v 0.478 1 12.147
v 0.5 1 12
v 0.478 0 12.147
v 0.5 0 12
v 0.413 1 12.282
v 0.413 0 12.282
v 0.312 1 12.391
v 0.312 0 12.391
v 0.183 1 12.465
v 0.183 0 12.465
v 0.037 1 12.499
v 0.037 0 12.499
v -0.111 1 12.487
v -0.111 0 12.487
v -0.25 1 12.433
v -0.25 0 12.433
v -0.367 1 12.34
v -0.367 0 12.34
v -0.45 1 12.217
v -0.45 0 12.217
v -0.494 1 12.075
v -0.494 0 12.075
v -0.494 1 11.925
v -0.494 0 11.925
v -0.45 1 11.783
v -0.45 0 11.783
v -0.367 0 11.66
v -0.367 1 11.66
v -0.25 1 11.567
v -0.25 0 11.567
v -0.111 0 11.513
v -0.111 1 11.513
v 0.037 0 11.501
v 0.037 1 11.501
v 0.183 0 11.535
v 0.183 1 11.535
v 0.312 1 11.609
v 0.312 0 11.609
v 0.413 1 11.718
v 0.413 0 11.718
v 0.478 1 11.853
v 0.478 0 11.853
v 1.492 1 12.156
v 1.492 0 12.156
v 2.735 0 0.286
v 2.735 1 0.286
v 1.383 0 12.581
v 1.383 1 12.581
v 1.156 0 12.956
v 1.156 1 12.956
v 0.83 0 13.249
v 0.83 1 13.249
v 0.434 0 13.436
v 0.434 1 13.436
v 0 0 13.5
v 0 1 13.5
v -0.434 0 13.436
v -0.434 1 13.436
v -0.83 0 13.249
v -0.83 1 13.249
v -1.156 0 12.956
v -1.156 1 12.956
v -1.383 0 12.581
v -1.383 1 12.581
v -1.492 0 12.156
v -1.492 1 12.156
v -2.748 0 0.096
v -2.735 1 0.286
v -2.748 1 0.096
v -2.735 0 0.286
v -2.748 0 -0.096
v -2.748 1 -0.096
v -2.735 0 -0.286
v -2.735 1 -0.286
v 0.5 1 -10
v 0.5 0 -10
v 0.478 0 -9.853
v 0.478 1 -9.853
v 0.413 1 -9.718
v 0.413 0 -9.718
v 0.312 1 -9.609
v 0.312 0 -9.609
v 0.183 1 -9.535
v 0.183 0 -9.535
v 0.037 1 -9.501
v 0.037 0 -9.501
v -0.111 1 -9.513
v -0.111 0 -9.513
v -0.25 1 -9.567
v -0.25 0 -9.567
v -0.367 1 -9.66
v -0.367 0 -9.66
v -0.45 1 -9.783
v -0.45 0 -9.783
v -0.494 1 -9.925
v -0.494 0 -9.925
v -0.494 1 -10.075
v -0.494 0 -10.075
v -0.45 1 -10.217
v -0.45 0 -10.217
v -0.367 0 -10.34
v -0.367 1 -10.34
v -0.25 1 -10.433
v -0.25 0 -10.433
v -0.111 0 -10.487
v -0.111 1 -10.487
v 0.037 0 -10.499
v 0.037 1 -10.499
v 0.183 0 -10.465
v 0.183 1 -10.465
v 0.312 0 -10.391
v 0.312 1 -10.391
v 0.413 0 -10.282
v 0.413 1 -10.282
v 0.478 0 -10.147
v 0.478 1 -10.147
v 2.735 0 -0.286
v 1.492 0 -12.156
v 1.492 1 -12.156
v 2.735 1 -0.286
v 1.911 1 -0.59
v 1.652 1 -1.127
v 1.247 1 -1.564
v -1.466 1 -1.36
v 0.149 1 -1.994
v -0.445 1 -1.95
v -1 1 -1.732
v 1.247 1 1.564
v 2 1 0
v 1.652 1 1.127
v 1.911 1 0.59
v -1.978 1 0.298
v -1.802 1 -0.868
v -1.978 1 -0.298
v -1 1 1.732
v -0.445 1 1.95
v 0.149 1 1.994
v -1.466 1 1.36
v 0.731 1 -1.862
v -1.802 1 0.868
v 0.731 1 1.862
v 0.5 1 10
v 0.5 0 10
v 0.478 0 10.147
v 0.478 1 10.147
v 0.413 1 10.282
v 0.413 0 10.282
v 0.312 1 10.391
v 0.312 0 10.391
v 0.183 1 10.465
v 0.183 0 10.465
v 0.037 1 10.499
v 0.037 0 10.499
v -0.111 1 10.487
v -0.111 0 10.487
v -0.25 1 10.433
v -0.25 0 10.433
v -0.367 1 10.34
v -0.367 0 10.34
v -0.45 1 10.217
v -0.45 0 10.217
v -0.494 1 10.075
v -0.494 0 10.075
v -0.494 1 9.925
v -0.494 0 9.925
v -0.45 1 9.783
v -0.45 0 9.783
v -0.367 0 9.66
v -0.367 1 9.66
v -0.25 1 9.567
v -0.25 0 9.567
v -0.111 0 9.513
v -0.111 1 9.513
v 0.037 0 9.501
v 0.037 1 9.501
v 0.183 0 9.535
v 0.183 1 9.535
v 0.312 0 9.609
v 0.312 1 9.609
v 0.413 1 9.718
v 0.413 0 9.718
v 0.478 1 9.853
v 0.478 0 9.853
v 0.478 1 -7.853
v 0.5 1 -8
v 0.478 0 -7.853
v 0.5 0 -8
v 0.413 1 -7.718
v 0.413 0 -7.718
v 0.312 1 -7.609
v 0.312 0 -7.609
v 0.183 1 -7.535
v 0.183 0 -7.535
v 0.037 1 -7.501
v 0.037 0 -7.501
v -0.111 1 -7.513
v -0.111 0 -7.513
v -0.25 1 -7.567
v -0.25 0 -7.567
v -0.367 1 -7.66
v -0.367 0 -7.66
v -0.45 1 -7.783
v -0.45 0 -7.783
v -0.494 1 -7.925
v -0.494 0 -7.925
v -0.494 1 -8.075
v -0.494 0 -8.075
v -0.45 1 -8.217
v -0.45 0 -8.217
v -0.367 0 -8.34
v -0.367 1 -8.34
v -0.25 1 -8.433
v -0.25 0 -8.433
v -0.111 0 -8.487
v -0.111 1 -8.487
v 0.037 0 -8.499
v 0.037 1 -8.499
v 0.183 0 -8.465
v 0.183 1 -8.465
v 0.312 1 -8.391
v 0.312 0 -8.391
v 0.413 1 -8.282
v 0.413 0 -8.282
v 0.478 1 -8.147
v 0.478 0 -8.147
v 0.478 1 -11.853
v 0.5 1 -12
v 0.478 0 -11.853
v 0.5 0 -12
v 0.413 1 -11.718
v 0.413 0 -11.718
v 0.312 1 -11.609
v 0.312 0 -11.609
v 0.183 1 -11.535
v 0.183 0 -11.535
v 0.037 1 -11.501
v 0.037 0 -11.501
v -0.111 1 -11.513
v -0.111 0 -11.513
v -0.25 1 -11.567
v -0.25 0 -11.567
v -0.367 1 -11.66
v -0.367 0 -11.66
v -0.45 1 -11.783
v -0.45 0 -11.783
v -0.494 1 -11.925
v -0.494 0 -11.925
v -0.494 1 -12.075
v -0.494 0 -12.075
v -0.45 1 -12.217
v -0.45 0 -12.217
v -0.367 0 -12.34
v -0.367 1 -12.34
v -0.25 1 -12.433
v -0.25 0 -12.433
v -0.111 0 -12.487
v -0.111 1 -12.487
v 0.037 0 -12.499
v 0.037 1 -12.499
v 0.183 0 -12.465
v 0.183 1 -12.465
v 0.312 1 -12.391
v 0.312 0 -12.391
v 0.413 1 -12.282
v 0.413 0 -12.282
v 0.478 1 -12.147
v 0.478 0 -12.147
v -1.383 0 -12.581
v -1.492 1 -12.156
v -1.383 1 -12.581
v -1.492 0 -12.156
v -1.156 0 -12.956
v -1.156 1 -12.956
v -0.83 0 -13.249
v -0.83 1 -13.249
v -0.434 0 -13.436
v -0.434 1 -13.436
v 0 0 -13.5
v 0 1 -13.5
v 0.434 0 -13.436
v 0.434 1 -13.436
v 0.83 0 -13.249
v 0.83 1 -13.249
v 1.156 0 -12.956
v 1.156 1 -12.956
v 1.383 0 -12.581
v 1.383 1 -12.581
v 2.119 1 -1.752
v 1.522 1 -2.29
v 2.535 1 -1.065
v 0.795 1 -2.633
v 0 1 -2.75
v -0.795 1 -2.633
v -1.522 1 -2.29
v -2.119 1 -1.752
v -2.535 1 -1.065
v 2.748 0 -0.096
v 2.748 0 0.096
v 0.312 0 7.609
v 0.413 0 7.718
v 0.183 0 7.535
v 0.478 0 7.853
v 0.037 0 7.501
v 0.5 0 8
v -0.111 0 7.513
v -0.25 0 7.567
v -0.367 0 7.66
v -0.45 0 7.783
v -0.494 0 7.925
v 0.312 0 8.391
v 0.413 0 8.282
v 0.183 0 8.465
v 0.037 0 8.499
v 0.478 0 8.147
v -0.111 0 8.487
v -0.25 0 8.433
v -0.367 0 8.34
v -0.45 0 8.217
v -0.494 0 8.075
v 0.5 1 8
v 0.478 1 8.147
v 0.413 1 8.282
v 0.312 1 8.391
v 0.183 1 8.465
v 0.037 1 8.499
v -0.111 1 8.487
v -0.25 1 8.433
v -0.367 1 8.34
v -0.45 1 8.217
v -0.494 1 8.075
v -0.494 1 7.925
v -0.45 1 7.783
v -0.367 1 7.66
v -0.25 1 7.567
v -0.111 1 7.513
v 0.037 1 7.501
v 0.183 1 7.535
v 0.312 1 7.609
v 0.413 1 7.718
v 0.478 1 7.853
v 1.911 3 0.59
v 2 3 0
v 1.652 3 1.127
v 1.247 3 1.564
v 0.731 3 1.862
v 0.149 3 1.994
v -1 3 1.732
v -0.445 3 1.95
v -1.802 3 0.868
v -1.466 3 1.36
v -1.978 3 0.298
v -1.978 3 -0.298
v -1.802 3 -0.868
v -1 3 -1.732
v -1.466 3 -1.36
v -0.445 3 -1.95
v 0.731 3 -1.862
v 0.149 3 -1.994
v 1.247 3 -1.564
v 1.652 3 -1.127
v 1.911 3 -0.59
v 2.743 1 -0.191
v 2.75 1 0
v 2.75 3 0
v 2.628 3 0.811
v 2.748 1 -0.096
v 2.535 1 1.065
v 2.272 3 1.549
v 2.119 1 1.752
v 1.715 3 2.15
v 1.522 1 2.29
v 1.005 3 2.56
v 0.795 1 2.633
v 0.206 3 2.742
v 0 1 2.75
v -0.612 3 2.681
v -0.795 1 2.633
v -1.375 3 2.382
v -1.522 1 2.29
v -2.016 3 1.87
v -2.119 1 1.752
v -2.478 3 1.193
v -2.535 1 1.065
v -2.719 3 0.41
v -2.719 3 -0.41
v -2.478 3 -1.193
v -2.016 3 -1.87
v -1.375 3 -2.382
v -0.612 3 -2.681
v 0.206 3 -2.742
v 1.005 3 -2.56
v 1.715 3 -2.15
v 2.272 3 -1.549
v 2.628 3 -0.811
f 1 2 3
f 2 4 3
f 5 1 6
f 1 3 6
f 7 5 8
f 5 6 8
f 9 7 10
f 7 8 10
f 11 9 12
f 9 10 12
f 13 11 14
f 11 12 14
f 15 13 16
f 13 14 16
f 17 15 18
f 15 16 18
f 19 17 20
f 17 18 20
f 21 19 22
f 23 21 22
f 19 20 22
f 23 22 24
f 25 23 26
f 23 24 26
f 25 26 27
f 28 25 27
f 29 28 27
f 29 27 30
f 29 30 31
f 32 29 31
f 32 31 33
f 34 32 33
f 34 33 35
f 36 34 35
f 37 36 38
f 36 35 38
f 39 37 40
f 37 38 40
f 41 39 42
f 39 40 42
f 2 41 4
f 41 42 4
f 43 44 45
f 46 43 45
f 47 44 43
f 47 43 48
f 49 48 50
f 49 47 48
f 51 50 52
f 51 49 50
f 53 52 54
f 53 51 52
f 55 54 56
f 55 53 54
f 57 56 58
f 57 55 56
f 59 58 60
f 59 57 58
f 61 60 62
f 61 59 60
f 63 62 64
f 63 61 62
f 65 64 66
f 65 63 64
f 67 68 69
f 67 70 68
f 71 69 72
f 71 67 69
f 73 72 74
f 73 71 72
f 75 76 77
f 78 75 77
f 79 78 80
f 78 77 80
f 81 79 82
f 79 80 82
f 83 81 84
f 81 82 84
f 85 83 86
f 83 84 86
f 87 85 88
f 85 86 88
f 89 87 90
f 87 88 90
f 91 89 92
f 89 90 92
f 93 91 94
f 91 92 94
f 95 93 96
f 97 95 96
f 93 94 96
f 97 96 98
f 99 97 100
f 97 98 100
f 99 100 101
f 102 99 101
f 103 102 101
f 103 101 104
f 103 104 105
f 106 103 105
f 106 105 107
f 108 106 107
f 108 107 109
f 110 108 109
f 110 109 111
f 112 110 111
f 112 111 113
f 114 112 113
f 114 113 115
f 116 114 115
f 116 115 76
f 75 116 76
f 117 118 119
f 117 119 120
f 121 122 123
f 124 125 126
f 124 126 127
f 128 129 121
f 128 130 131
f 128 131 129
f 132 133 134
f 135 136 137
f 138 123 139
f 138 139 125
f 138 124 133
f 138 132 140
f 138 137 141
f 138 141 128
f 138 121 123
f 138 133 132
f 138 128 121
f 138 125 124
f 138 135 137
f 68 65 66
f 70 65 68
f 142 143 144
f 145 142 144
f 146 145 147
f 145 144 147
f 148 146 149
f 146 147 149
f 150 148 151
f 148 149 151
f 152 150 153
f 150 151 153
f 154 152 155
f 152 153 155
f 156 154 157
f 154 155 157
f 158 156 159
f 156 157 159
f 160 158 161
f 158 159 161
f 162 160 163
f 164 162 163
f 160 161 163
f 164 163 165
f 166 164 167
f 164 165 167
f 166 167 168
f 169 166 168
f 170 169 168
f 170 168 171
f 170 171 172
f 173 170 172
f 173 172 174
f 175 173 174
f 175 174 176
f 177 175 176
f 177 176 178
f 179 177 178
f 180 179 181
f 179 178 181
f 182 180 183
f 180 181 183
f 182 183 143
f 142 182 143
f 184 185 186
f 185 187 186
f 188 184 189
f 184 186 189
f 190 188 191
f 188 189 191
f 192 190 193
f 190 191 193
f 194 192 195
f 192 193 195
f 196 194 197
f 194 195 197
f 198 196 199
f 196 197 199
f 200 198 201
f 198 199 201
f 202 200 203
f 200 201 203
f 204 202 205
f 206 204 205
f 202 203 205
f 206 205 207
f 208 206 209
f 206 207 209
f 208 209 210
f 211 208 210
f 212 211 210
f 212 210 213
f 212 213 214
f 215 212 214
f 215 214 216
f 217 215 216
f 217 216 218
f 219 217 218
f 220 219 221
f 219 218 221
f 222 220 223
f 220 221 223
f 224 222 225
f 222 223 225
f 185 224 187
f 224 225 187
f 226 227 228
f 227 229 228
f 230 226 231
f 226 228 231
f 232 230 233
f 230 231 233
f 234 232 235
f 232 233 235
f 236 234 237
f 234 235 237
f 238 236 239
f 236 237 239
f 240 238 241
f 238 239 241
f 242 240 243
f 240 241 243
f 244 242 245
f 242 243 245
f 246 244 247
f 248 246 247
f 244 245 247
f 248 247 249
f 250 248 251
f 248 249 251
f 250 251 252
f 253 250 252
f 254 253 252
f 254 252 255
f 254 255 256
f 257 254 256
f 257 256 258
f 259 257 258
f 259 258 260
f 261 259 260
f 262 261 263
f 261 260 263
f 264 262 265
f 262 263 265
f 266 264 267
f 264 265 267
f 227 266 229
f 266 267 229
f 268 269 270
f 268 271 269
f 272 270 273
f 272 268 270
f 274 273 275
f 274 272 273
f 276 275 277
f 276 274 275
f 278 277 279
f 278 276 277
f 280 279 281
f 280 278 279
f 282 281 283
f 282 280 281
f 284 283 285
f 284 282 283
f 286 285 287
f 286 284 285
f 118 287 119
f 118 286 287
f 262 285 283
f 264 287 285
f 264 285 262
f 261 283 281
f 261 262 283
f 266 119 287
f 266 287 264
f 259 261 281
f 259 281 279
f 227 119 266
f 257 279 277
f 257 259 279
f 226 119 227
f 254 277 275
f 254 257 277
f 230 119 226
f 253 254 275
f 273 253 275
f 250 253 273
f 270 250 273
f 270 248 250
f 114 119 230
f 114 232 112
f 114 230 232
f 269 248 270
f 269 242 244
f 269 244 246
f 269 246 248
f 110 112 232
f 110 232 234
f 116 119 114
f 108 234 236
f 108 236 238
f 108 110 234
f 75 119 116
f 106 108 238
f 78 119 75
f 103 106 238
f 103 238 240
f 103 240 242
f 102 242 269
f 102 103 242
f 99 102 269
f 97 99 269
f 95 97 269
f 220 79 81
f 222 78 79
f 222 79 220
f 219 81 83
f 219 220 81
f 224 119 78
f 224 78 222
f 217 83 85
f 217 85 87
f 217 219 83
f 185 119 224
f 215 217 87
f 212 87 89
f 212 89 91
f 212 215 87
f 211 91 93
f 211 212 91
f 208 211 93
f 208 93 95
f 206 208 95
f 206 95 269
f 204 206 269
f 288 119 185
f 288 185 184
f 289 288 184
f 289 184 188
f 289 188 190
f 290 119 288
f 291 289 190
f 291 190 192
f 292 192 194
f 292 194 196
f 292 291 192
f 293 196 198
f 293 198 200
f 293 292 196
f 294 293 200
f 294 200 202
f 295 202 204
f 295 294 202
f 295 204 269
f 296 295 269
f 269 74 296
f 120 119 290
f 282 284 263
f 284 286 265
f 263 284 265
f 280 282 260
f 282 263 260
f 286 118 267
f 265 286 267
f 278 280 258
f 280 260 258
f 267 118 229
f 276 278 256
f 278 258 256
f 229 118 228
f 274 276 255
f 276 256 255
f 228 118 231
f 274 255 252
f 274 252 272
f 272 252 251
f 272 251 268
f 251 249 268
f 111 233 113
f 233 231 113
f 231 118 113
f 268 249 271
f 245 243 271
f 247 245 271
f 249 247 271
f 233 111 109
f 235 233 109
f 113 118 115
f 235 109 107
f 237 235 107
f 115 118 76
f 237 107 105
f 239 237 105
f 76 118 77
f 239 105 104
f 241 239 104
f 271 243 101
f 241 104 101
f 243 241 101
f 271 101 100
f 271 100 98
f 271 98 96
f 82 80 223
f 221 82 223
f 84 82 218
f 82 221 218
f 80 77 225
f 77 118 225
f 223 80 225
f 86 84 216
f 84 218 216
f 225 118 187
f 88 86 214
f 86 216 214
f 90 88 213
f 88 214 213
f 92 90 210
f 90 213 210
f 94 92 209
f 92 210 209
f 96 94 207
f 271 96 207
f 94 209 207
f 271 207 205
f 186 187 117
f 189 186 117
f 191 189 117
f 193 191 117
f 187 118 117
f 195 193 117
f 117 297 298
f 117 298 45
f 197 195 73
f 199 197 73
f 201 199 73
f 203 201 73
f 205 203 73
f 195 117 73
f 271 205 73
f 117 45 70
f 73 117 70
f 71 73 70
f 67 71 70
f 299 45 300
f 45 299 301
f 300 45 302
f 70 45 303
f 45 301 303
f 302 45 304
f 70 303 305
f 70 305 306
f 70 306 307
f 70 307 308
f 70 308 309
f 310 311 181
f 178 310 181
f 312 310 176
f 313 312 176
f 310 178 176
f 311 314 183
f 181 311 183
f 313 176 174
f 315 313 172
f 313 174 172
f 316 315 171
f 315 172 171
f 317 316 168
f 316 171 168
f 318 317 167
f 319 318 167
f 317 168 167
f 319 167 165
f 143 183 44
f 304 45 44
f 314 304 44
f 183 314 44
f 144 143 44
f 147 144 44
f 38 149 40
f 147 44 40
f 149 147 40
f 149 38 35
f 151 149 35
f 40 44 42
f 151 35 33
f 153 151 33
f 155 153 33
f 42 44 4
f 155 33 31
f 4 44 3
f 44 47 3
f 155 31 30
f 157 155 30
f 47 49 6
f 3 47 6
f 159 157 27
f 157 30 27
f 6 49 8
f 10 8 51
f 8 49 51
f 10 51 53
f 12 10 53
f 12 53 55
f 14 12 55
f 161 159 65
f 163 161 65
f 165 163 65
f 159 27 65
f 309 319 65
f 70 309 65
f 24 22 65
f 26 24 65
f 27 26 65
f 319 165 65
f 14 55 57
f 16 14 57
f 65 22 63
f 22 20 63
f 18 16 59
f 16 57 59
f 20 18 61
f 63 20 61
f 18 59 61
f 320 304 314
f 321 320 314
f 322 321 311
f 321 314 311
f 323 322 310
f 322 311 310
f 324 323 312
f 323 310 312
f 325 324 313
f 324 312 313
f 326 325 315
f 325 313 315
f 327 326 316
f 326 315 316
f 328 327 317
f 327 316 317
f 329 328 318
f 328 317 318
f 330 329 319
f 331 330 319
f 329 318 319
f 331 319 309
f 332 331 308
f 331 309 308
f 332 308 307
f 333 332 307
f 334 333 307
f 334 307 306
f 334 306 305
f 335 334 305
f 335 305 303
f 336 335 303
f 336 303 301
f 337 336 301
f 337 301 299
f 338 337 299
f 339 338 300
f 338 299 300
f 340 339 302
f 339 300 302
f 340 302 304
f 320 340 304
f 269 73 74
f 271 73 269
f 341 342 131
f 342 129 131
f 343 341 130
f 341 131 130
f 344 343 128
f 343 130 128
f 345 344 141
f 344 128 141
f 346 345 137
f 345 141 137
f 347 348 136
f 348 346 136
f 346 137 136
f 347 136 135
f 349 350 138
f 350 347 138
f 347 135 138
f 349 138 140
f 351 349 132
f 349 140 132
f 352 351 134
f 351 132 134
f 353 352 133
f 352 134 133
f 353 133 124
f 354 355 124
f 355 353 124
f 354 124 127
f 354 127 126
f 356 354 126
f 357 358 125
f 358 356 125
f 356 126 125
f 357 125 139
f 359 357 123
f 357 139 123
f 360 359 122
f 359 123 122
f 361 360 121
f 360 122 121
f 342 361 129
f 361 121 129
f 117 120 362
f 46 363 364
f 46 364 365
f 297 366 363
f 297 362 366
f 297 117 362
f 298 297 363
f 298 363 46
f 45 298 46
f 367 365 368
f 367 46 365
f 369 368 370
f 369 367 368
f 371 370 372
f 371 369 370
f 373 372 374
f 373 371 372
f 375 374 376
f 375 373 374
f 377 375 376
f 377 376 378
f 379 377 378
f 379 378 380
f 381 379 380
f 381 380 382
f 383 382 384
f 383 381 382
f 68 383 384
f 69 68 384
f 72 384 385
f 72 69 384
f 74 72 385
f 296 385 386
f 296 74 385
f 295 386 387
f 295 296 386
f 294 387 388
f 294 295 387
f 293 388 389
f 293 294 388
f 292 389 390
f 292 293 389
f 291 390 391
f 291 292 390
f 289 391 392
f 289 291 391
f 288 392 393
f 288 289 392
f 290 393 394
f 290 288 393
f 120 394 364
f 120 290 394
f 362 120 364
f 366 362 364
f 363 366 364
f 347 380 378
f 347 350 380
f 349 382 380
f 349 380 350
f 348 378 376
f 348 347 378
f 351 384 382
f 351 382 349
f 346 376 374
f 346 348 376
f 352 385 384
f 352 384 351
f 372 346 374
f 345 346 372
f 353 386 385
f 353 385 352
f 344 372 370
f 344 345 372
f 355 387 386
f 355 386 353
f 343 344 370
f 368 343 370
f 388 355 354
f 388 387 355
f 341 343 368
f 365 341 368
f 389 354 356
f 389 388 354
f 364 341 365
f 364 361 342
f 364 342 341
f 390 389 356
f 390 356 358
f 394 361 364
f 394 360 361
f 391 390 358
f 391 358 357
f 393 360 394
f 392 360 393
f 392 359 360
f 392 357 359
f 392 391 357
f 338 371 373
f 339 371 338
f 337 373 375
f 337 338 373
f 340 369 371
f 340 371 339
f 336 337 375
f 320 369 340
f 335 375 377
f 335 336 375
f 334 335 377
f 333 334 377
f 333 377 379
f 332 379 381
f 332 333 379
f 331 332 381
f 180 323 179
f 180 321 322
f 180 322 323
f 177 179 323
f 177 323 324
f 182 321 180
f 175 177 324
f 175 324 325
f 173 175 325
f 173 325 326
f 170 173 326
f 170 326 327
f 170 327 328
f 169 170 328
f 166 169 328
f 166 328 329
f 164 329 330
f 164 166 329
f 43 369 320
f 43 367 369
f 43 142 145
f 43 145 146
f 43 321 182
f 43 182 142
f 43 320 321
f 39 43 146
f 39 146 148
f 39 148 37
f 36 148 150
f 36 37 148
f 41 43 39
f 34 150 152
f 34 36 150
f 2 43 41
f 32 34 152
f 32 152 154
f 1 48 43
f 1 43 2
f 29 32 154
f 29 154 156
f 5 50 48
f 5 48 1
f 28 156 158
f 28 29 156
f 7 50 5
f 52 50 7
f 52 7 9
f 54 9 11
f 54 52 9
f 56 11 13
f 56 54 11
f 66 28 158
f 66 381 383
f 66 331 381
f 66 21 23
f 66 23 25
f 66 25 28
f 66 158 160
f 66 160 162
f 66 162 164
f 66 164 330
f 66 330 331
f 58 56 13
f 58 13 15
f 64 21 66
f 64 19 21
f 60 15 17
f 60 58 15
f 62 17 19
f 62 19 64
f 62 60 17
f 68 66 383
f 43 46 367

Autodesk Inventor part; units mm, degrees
ref_plane "YZ Plane" through (0, 0, 0) normal (1, 0, 0) x (0, 1, 0)
ref_plane "XZ Plane" through (0, 0, 0) normal (0, 1, 0) x (-1, 0, 0)
ref_plane "XY Plane" through (0, 0, 0) normal (0, 0, 1) x (1, 0, 0)
sketch "Sketch1" plane through (0, 0, 0) normal (0, 1, 0) x (-1, 0, 0)
  circle A0 centre (0, 0) radius 2.75
  circle A1 centre (0, 12) radius 1.5
  circle A2 centre (0, -12) radius 1.5
  line L0 (0, 12) -> (0, -12) construction
  line L1 (2.735, -0.2865) -> (1.4918, -12.1562)
  line L2 (-1.4918, 12.1563) -> (-2.735, 0.2865)
  line L3 (-1.4918, -12.1562) -> (-2.735, -0.2865)
  line L4 (1.4918, 12.1563) -> (2.735, 0.2865)
  dimension "d0" = 5.5
  dimension "d1" = 3
  dimension "d2" = 27
extrude "Extrusion1" add sketch "Sketch1" along normal blind 1
sketch "Sketch2" plane through (0, 1, 0) normal (0, 1, 0) x (1, 0, 0)
  circle A0 centre (0, 0) radius 2.75
  circle A1 centre (0, 0) radius 2
  dimension "d5" = 5.5
  dimension "d6" = 4
extrude "Extrusion2" add sketch "Sketch2" along normal blind 2
sketch "Sketch3" plane through (0, 0, 0) normal (0, -1, 0) x (1, 0, 0)
  line L0 (-1.4918, -12.1562) -> (-2.735, -0.2865) projected
  arc A0 (-1.4918, -12.1562) -> (1.4918, -12.1562) centre (0, -12) ccw projected
  line L1 (2.735, -0.2865) -> (1.4918, -12.1562) projected
  arc A1 (2.735, -0.2865) -> (2.735, 0.2865) centre (0, 0) ccw projected
  line L2 (1.4918, 12.1563) -> (2.735, 0.2865) projected
  arc A2 (1.4918, 12.1563) -> (-1.4918, 12.1563) centre (0, 12) ccw projected
  line L3 (-2.735, 0.2865) -> (-1.4918, 12.1563) projected
  arc A3 (-2.735, 0.2865) -> (-2.735, -0.2865) centre (0, 0) ccw projected
  circle A4 centre (0, -12) radius 0.5
  circle A5 centre (0, -10) radius 0.5
  circle A6 centre (0, -8) radius 0.5
  circle A7 centre (0, 8) radius 0.5
  circle A8 centre (0, 10) radius 0.5
  circle A9 centre (0, 12) radius 0.5
  dimension "d9" = 1
  dimension "d10" = 1
  dimension "d11" = 1
  dimension "d12" = 1
  dimension "d13" = 1
  dimension "d16" = 180
extrude "Extrusion3" cut sketch "Sketch3" against normal through all contours A4 | A5 | A6 | A7 | A8 | A9
properties part number "Dual Servo Attachment" material "ABS Plastic"
